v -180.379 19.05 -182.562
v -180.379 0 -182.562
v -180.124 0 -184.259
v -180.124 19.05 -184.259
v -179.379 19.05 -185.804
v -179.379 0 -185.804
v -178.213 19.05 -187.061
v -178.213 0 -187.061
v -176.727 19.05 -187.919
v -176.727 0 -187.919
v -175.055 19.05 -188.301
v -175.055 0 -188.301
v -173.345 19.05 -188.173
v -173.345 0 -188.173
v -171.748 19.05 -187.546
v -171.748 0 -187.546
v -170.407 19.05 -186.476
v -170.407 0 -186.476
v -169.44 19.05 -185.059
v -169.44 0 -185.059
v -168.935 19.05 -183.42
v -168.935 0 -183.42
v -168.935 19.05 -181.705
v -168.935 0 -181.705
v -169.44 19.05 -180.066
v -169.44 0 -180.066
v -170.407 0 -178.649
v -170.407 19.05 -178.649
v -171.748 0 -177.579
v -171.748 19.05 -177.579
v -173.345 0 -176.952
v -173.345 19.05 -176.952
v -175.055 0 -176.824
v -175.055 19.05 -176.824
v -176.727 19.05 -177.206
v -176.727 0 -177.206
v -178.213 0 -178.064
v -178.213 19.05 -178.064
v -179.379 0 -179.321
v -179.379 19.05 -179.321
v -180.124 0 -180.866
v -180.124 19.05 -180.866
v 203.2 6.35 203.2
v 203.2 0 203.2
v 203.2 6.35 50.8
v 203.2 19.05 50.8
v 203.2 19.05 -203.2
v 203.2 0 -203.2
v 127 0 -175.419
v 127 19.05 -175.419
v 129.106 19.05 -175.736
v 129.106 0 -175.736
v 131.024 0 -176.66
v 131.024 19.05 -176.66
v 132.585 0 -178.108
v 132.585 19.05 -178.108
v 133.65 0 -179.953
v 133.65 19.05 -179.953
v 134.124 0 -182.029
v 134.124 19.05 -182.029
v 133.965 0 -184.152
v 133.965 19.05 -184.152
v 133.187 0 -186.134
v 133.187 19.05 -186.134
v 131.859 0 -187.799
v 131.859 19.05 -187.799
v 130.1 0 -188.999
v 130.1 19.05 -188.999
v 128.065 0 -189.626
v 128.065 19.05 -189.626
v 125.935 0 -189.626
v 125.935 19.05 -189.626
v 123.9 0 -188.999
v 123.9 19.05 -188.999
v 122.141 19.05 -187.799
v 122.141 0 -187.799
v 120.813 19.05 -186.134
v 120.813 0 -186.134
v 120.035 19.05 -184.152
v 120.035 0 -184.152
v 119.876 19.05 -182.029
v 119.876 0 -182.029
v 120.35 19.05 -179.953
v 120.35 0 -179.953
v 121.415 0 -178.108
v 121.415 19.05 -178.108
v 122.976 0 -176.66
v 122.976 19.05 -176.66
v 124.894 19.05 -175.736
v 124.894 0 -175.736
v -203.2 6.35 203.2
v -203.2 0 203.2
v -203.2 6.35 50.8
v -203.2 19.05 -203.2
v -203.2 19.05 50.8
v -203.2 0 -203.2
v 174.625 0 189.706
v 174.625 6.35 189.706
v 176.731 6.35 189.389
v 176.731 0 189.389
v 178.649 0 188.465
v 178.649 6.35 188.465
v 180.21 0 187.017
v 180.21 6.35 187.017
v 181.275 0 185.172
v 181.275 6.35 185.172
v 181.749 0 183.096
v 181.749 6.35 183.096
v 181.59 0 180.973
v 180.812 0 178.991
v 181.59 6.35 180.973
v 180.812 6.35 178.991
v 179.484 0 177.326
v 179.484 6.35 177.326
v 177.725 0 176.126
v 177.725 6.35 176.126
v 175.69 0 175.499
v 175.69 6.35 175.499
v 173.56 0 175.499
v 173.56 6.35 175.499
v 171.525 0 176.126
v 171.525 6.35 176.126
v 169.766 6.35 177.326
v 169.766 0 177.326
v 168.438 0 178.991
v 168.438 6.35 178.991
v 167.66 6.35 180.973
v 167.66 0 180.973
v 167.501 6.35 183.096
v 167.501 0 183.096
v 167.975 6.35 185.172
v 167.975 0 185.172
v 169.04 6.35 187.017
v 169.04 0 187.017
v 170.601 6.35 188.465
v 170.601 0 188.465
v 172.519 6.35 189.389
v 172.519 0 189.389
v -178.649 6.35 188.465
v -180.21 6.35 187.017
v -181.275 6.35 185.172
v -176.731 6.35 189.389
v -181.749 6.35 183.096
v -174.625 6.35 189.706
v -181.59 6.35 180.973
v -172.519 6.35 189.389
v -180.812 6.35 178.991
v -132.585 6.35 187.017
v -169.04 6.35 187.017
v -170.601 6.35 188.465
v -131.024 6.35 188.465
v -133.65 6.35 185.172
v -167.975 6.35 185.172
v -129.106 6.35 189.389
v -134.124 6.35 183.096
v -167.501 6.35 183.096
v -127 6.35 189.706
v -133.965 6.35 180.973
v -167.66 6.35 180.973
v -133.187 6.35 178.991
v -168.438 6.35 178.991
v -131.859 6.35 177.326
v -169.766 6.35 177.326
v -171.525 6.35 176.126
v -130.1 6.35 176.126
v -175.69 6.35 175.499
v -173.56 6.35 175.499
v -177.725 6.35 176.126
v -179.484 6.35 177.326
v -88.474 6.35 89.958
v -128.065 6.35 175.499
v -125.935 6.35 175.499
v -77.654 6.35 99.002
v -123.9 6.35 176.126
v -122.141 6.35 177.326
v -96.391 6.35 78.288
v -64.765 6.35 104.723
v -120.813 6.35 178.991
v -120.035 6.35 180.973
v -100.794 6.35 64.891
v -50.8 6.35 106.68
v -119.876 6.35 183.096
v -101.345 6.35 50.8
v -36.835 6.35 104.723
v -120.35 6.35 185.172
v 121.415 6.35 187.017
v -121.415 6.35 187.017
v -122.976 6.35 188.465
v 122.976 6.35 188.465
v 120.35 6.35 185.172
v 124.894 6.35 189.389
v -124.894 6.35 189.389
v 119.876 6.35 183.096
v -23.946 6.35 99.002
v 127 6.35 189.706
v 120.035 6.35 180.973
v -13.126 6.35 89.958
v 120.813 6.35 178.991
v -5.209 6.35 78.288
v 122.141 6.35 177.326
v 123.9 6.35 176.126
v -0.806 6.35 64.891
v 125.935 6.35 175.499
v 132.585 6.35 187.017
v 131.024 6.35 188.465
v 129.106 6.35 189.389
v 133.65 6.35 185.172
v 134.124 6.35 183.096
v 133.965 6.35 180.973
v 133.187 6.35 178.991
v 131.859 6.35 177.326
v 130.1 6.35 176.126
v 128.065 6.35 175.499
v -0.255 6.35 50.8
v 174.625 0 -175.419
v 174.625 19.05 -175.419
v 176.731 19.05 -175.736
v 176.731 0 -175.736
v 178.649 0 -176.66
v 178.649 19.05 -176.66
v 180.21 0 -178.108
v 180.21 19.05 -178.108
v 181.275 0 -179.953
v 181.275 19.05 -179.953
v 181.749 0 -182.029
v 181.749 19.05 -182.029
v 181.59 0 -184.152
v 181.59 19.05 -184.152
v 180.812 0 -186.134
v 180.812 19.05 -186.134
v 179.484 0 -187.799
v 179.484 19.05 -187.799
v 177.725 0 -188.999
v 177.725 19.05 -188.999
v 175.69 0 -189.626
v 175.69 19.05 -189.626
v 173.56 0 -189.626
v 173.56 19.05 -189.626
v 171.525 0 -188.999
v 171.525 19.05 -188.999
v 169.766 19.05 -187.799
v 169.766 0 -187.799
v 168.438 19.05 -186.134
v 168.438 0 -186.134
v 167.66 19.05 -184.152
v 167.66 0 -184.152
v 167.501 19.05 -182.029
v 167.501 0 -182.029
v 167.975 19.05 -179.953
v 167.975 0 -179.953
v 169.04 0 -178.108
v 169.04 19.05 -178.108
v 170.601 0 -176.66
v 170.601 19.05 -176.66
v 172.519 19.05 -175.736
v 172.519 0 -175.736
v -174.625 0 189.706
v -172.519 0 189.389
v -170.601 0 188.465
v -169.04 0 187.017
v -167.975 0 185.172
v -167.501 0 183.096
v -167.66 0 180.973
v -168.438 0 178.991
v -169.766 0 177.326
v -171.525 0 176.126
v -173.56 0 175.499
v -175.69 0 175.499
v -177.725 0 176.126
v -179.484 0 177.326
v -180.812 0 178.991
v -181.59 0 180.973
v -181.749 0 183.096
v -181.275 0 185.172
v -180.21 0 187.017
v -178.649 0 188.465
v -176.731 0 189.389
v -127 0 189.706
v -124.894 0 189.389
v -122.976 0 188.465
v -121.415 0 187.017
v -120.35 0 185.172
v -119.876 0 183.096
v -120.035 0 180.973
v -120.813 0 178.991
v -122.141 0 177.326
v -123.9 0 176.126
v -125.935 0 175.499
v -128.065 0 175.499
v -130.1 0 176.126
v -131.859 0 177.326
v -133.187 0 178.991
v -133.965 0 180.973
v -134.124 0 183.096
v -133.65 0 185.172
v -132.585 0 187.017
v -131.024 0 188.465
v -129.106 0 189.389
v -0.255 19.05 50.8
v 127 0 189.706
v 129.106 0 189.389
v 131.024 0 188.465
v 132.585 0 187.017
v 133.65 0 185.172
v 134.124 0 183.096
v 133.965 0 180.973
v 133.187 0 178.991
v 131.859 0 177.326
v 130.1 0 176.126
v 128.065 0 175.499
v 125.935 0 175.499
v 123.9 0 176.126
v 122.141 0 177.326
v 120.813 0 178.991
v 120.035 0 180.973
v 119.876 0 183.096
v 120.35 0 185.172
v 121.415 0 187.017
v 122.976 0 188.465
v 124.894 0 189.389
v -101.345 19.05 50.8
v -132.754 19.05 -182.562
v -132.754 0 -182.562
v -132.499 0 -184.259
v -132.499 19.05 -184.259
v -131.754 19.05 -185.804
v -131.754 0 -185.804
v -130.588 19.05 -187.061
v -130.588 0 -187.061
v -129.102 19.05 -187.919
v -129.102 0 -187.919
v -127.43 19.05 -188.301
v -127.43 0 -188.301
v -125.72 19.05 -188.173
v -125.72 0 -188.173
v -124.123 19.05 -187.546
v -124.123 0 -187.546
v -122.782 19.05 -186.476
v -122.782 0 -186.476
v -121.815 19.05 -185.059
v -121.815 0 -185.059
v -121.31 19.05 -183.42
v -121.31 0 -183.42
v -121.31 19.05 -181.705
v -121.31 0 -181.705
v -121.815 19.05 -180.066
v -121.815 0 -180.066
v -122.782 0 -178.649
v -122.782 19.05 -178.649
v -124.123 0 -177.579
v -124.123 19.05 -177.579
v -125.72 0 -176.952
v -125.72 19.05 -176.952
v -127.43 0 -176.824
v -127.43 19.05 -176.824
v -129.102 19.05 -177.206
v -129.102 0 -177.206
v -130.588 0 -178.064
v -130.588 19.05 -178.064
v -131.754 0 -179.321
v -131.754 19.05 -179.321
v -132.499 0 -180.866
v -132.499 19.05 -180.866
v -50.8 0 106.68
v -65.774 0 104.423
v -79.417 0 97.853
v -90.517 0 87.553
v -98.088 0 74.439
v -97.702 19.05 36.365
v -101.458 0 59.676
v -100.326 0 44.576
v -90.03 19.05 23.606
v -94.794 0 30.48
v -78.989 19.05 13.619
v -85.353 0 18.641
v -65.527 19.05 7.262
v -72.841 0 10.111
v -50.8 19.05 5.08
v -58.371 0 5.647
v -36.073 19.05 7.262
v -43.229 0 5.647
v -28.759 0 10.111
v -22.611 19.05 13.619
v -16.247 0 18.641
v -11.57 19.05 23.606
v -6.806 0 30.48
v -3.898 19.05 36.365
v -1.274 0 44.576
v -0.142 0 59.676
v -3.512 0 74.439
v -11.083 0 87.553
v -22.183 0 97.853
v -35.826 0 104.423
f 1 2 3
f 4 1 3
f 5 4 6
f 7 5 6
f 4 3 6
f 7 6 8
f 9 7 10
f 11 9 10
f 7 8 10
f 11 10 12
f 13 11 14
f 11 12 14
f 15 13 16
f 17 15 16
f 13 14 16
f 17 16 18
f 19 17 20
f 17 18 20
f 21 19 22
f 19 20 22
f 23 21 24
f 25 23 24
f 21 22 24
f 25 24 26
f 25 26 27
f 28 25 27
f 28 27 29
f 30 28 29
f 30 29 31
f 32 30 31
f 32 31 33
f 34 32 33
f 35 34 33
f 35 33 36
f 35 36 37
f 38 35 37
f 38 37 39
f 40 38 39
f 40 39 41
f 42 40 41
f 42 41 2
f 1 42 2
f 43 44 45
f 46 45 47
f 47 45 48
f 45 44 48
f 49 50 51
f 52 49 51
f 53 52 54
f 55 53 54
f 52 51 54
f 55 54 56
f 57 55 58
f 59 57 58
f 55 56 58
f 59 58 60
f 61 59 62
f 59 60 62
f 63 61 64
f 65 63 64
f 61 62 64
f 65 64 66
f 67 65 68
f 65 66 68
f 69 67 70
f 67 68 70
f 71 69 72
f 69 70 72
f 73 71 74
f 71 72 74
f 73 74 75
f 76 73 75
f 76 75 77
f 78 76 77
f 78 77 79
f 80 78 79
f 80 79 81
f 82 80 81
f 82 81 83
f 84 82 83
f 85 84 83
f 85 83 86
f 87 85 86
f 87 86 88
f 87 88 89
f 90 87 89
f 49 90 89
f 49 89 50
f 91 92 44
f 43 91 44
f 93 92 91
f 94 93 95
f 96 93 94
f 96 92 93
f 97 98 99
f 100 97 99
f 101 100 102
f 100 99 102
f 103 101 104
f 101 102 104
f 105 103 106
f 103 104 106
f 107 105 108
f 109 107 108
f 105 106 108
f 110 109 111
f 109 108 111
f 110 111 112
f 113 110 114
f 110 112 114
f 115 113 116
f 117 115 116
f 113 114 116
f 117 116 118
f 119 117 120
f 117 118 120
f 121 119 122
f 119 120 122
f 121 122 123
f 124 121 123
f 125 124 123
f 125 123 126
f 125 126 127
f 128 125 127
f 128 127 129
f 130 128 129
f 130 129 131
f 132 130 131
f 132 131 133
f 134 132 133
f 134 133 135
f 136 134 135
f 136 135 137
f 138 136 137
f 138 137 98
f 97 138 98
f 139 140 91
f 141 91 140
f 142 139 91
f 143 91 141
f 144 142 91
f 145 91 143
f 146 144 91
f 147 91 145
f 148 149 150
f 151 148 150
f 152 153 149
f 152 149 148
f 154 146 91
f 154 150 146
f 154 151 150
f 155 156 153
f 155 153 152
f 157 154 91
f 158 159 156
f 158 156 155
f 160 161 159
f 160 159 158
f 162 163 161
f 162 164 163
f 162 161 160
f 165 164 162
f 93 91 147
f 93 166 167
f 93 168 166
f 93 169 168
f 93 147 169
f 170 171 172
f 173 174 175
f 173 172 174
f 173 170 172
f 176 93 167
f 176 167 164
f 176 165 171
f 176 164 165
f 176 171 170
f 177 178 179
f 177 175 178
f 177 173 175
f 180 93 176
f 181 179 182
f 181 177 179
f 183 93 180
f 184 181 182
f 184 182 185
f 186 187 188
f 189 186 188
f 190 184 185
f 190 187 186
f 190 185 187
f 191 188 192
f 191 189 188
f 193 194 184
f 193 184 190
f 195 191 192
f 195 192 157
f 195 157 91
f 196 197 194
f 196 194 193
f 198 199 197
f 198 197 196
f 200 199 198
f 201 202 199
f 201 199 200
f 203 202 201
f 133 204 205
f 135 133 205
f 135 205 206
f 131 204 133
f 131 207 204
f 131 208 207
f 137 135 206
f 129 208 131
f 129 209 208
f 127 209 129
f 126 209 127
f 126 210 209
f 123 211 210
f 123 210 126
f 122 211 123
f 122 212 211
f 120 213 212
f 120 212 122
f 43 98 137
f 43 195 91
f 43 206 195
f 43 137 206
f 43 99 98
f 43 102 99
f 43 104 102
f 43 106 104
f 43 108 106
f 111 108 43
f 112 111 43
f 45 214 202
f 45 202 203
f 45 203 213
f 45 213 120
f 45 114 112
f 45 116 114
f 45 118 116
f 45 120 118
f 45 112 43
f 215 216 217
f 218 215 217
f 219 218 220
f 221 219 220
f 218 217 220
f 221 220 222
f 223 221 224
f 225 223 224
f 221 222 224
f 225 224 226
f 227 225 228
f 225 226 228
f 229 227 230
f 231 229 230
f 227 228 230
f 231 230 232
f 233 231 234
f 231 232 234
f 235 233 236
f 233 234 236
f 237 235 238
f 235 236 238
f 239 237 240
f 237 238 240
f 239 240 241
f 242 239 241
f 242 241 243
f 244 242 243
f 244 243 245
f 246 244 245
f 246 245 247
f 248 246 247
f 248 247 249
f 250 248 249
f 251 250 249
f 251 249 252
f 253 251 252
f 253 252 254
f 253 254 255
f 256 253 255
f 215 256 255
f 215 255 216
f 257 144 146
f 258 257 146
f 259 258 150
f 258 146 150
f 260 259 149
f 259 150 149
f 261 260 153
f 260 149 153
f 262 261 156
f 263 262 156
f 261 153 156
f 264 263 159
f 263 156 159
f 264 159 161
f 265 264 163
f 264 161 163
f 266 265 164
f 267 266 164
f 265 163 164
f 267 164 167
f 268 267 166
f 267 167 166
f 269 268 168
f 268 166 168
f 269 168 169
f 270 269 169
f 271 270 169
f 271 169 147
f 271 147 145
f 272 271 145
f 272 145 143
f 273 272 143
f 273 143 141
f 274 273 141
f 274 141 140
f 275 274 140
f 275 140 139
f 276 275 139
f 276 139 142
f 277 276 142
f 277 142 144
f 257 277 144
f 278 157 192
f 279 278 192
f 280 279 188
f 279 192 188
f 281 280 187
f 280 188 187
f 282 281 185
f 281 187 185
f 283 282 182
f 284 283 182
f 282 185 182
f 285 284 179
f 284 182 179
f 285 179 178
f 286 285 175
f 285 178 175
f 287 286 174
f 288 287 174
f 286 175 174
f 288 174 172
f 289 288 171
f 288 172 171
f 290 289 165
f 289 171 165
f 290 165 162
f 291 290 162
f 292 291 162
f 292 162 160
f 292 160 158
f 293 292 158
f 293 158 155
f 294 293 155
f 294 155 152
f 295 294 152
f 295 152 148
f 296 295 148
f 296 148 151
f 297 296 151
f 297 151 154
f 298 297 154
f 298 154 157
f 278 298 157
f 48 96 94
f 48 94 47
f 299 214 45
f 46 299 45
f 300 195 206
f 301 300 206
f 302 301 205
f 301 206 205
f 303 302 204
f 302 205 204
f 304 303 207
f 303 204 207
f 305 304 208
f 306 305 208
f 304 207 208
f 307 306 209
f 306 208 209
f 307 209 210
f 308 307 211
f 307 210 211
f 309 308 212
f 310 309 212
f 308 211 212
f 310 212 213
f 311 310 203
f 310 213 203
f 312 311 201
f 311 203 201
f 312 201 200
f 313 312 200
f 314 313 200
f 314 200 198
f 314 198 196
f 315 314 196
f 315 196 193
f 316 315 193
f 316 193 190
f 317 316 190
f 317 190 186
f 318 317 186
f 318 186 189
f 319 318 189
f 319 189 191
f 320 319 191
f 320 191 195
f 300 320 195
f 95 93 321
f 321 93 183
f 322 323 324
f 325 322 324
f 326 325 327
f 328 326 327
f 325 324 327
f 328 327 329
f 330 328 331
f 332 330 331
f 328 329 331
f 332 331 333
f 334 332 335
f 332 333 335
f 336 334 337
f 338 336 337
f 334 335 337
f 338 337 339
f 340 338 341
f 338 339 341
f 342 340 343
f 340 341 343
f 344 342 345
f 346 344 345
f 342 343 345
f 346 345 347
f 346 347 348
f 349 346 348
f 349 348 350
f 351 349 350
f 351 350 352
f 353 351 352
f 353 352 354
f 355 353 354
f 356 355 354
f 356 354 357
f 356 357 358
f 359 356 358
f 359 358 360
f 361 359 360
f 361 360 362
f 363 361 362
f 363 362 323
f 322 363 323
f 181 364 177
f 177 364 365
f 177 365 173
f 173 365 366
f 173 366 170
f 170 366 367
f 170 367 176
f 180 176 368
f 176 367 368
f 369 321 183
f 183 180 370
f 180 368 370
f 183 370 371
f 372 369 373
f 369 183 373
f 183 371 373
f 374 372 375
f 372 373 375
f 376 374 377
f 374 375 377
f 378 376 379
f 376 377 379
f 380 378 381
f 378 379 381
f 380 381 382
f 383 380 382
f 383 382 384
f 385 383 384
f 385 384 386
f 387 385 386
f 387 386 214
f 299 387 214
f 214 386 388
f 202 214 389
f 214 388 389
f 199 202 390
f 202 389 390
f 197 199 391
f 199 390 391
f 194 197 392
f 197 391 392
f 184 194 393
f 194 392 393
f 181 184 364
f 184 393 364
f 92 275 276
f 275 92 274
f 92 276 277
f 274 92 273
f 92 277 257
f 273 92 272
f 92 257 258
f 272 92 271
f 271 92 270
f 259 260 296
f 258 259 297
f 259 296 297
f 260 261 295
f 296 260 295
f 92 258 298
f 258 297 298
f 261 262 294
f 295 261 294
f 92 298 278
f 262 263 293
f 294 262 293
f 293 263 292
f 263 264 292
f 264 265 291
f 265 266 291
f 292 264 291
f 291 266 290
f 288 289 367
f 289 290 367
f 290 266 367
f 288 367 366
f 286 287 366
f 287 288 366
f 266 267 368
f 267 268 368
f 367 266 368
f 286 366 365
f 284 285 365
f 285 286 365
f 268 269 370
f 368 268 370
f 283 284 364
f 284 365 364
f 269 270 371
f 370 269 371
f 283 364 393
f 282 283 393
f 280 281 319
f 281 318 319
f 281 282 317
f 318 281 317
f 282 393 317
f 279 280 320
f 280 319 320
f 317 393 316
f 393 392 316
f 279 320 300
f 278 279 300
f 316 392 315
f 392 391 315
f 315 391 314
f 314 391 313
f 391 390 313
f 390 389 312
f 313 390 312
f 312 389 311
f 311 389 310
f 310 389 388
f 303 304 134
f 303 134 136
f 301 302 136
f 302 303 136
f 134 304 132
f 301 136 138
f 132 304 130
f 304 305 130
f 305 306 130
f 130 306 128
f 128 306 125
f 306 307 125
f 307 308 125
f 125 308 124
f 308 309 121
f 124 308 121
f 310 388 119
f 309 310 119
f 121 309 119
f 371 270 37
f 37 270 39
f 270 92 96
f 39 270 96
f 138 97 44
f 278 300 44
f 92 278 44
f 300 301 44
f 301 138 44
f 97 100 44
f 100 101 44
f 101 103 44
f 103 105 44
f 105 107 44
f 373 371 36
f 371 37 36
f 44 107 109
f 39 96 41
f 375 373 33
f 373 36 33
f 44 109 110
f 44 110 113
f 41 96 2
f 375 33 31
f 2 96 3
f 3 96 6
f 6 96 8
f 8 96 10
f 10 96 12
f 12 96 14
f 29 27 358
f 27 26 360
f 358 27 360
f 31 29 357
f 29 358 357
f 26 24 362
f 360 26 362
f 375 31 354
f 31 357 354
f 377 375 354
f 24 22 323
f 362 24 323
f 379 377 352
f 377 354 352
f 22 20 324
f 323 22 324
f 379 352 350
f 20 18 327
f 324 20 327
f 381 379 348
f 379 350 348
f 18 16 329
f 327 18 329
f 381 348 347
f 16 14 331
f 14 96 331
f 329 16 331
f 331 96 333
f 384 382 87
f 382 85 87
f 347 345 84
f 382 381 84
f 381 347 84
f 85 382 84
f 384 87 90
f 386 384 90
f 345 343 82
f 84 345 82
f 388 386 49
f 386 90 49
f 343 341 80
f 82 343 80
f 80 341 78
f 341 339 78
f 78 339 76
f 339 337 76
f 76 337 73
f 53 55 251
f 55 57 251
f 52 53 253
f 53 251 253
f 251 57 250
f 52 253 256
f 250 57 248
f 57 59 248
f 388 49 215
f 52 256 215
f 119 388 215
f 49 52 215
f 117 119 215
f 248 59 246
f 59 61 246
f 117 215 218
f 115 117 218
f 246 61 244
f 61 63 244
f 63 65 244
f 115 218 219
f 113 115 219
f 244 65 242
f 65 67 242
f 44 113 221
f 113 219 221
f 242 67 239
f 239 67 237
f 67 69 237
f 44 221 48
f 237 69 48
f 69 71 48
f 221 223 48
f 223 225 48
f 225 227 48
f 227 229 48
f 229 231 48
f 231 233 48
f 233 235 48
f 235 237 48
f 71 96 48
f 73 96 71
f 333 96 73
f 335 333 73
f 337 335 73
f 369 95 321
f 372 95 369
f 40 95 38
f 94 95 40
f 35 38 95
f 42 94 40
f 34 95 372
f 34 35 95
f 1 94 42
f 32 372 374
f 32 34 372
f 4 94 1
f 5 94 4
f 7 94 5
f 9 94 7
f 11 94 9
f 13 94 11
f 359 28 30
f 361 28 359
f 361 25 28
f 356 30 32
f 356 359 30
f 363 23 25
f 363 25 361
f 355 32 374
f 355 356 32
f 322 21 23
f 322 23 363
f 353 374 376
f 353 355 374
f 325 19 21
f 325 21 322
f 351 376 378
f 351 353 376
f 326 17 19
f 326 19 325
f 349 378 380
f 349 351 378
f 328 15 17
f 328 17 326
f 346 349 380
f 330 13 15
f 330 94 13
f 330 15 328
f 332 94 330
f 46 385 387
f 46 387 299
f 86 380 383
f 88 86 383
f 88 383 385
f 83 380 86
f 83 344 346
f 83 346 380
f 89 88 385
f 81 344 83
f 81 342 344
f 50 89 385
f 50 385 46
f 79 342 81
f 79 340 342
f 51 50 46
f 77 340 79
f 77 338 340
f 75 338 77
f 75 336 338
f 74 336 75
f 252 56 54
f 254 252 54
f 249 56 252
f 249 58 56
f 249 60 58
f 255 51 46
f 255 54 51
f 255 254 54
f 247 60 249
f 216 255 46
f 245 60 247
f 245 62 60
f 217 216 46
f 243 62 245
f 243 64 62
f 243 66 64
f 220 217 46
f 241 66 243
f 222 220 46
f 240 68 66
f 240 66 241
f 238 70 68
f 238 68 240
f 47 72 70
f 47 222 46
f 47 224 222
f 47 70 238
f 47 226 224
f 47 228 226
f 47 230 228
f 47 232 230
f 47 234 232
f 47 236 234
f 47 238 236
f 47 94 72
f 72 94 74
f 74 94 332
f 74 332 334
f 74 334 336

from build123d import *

# Parameters (mm, degrees)
SKETCH1_W               = 406.4
SKETCH1_H               = 406.4
BOSS_EXTRUDE1_DEPTH     = 6.35
SKETCH2_R               = 50.8
CUT_EXTRUDE1_DEPTH      = 6.35
SKETCH3_W               = 406.4
SKETCH3_H               = 254
BOSS_EXTRUDE4_DEPTH     = 12.7
SKETCH6_R               = 50.8
CUT_EXTRUDE3_DEPTH      = 288.998927949
SKETCH7_R               = 7.14375
CUT_EXTRUDE4_DEPTH      = 288.648691984
F_1_2_20_TAPPED_HOLE1_D = 11.50874
SKETCH11_R              = 7.14375
CUT_EXTRUDE5_DEPTH      = 288.998927949


with BuildPart() as part:
    # Sketch1 → Boss-Extrude1 (new body)
    with BuildSketch(Plane(origin=(0, 0, 0), x_dir=(1, 0, 0), z_dir=(0, 1, 0))):
        Rectangle(SKETCH1_W, SKETCH1_H)
    extrude(amount=BOSS_EXTRUDE1_DEPTH)

    # Sketch2 → Cut-Extrude1 (cut)
    with BuildSketch(Plane(origin=(0, 6.35, 0), x_dir=(1, 0, 0), z_dir=(0, 1, 0))):
        with Locations(Location((-50.8, -55.88, 0), (0, 0, 270))):
            Circle(SKETCH2_R)
    extrude(amount=-CUT_EXTRUDE1_DEPTH, mode=Mode.SUBTRACT)

    # Sketch3 → Boss-Extrude4 (add)
    with BuildSketch(Plane(origin=(0, 6.35, 0), x_dir=(1, 0, 0), z_dir=(0, 1, 0))):
        with Locations((0, 76.2)):
            Rectangle(SKETCH3_W, SKETCH3_H)
    extrude(amount=BOSS_EXTRUDE4_DEPTH)

    # Sketch6 → Cut-Extrude3 (cut, through all)
    with BuildSketch(Plane.XZ):
        with Locations(Location((-50.8, 55.88, 0), (0, 0, 90))):
            Circle(SKETCH6_R)
    extrude(amount=-CUT_EXTRUDE3_DEPTH, mode=Mode.SUBTRACT)

    # Sketch7 → Cut-Extrude4 (cut, through all)
    with BuildSketch(Plane(origin=(0, 6.35, 0), x_dir=(1, 0, 0), z_dir=(0, 1, 0))):
        with Locations(Location((174.625, -182.5625, 0), (0, 0, 270))):
            Circle(SKETCH7_R)
        with Locations(Location((127, -182.5625, 0), (0, 0, 270))):
            Circle(SKETCH7_R)
        with Locations(Location((-174.625, -182.5625, 0), (0, 0, 270))):
            Circle(SKETCH7_R)
        with Locations(Location((-127, -182.5625, 0), (0, 0, 270))):
            Circle(SKETCH7_R)
    extrude(amount=-CUT_EXTRUDE4_DEPTH, mode=Mode.SUBTRACT)

    # 1/2-20 Tapped Hole1 (through all)
    with Locations(Plane(origin=(0, 19.05, 0), x_dir=(1, 0, 0), z_dir=(0, 1, 0))):
        with Locations((-174.625, 182.5625), (-127, 182.5625)):
            Hole(F_1_2_20_TAPPED_HOLE1_D / 2)

    # Sketch11 → Cut-Extrude5 (cut, through all)
    with BuildSketch(Plane(origin=(0, 19.05, 0), x_dir=(1, 0, 0), z_dir=(0, 1, 0))):
        with Locations(Location((174.625, 182.5625, 0), (0, 0, 270))):
            Circle(SKETCH11_R)
        with Locations(Location((127, 182.5625, 0), (0, 0, 270))):
            Circle(SKETCH11_R)
    extrude(amount=-CUT_EXTRUDE5_DEPTH, mode=Mode.SUBTRACT)


solid = part.part
